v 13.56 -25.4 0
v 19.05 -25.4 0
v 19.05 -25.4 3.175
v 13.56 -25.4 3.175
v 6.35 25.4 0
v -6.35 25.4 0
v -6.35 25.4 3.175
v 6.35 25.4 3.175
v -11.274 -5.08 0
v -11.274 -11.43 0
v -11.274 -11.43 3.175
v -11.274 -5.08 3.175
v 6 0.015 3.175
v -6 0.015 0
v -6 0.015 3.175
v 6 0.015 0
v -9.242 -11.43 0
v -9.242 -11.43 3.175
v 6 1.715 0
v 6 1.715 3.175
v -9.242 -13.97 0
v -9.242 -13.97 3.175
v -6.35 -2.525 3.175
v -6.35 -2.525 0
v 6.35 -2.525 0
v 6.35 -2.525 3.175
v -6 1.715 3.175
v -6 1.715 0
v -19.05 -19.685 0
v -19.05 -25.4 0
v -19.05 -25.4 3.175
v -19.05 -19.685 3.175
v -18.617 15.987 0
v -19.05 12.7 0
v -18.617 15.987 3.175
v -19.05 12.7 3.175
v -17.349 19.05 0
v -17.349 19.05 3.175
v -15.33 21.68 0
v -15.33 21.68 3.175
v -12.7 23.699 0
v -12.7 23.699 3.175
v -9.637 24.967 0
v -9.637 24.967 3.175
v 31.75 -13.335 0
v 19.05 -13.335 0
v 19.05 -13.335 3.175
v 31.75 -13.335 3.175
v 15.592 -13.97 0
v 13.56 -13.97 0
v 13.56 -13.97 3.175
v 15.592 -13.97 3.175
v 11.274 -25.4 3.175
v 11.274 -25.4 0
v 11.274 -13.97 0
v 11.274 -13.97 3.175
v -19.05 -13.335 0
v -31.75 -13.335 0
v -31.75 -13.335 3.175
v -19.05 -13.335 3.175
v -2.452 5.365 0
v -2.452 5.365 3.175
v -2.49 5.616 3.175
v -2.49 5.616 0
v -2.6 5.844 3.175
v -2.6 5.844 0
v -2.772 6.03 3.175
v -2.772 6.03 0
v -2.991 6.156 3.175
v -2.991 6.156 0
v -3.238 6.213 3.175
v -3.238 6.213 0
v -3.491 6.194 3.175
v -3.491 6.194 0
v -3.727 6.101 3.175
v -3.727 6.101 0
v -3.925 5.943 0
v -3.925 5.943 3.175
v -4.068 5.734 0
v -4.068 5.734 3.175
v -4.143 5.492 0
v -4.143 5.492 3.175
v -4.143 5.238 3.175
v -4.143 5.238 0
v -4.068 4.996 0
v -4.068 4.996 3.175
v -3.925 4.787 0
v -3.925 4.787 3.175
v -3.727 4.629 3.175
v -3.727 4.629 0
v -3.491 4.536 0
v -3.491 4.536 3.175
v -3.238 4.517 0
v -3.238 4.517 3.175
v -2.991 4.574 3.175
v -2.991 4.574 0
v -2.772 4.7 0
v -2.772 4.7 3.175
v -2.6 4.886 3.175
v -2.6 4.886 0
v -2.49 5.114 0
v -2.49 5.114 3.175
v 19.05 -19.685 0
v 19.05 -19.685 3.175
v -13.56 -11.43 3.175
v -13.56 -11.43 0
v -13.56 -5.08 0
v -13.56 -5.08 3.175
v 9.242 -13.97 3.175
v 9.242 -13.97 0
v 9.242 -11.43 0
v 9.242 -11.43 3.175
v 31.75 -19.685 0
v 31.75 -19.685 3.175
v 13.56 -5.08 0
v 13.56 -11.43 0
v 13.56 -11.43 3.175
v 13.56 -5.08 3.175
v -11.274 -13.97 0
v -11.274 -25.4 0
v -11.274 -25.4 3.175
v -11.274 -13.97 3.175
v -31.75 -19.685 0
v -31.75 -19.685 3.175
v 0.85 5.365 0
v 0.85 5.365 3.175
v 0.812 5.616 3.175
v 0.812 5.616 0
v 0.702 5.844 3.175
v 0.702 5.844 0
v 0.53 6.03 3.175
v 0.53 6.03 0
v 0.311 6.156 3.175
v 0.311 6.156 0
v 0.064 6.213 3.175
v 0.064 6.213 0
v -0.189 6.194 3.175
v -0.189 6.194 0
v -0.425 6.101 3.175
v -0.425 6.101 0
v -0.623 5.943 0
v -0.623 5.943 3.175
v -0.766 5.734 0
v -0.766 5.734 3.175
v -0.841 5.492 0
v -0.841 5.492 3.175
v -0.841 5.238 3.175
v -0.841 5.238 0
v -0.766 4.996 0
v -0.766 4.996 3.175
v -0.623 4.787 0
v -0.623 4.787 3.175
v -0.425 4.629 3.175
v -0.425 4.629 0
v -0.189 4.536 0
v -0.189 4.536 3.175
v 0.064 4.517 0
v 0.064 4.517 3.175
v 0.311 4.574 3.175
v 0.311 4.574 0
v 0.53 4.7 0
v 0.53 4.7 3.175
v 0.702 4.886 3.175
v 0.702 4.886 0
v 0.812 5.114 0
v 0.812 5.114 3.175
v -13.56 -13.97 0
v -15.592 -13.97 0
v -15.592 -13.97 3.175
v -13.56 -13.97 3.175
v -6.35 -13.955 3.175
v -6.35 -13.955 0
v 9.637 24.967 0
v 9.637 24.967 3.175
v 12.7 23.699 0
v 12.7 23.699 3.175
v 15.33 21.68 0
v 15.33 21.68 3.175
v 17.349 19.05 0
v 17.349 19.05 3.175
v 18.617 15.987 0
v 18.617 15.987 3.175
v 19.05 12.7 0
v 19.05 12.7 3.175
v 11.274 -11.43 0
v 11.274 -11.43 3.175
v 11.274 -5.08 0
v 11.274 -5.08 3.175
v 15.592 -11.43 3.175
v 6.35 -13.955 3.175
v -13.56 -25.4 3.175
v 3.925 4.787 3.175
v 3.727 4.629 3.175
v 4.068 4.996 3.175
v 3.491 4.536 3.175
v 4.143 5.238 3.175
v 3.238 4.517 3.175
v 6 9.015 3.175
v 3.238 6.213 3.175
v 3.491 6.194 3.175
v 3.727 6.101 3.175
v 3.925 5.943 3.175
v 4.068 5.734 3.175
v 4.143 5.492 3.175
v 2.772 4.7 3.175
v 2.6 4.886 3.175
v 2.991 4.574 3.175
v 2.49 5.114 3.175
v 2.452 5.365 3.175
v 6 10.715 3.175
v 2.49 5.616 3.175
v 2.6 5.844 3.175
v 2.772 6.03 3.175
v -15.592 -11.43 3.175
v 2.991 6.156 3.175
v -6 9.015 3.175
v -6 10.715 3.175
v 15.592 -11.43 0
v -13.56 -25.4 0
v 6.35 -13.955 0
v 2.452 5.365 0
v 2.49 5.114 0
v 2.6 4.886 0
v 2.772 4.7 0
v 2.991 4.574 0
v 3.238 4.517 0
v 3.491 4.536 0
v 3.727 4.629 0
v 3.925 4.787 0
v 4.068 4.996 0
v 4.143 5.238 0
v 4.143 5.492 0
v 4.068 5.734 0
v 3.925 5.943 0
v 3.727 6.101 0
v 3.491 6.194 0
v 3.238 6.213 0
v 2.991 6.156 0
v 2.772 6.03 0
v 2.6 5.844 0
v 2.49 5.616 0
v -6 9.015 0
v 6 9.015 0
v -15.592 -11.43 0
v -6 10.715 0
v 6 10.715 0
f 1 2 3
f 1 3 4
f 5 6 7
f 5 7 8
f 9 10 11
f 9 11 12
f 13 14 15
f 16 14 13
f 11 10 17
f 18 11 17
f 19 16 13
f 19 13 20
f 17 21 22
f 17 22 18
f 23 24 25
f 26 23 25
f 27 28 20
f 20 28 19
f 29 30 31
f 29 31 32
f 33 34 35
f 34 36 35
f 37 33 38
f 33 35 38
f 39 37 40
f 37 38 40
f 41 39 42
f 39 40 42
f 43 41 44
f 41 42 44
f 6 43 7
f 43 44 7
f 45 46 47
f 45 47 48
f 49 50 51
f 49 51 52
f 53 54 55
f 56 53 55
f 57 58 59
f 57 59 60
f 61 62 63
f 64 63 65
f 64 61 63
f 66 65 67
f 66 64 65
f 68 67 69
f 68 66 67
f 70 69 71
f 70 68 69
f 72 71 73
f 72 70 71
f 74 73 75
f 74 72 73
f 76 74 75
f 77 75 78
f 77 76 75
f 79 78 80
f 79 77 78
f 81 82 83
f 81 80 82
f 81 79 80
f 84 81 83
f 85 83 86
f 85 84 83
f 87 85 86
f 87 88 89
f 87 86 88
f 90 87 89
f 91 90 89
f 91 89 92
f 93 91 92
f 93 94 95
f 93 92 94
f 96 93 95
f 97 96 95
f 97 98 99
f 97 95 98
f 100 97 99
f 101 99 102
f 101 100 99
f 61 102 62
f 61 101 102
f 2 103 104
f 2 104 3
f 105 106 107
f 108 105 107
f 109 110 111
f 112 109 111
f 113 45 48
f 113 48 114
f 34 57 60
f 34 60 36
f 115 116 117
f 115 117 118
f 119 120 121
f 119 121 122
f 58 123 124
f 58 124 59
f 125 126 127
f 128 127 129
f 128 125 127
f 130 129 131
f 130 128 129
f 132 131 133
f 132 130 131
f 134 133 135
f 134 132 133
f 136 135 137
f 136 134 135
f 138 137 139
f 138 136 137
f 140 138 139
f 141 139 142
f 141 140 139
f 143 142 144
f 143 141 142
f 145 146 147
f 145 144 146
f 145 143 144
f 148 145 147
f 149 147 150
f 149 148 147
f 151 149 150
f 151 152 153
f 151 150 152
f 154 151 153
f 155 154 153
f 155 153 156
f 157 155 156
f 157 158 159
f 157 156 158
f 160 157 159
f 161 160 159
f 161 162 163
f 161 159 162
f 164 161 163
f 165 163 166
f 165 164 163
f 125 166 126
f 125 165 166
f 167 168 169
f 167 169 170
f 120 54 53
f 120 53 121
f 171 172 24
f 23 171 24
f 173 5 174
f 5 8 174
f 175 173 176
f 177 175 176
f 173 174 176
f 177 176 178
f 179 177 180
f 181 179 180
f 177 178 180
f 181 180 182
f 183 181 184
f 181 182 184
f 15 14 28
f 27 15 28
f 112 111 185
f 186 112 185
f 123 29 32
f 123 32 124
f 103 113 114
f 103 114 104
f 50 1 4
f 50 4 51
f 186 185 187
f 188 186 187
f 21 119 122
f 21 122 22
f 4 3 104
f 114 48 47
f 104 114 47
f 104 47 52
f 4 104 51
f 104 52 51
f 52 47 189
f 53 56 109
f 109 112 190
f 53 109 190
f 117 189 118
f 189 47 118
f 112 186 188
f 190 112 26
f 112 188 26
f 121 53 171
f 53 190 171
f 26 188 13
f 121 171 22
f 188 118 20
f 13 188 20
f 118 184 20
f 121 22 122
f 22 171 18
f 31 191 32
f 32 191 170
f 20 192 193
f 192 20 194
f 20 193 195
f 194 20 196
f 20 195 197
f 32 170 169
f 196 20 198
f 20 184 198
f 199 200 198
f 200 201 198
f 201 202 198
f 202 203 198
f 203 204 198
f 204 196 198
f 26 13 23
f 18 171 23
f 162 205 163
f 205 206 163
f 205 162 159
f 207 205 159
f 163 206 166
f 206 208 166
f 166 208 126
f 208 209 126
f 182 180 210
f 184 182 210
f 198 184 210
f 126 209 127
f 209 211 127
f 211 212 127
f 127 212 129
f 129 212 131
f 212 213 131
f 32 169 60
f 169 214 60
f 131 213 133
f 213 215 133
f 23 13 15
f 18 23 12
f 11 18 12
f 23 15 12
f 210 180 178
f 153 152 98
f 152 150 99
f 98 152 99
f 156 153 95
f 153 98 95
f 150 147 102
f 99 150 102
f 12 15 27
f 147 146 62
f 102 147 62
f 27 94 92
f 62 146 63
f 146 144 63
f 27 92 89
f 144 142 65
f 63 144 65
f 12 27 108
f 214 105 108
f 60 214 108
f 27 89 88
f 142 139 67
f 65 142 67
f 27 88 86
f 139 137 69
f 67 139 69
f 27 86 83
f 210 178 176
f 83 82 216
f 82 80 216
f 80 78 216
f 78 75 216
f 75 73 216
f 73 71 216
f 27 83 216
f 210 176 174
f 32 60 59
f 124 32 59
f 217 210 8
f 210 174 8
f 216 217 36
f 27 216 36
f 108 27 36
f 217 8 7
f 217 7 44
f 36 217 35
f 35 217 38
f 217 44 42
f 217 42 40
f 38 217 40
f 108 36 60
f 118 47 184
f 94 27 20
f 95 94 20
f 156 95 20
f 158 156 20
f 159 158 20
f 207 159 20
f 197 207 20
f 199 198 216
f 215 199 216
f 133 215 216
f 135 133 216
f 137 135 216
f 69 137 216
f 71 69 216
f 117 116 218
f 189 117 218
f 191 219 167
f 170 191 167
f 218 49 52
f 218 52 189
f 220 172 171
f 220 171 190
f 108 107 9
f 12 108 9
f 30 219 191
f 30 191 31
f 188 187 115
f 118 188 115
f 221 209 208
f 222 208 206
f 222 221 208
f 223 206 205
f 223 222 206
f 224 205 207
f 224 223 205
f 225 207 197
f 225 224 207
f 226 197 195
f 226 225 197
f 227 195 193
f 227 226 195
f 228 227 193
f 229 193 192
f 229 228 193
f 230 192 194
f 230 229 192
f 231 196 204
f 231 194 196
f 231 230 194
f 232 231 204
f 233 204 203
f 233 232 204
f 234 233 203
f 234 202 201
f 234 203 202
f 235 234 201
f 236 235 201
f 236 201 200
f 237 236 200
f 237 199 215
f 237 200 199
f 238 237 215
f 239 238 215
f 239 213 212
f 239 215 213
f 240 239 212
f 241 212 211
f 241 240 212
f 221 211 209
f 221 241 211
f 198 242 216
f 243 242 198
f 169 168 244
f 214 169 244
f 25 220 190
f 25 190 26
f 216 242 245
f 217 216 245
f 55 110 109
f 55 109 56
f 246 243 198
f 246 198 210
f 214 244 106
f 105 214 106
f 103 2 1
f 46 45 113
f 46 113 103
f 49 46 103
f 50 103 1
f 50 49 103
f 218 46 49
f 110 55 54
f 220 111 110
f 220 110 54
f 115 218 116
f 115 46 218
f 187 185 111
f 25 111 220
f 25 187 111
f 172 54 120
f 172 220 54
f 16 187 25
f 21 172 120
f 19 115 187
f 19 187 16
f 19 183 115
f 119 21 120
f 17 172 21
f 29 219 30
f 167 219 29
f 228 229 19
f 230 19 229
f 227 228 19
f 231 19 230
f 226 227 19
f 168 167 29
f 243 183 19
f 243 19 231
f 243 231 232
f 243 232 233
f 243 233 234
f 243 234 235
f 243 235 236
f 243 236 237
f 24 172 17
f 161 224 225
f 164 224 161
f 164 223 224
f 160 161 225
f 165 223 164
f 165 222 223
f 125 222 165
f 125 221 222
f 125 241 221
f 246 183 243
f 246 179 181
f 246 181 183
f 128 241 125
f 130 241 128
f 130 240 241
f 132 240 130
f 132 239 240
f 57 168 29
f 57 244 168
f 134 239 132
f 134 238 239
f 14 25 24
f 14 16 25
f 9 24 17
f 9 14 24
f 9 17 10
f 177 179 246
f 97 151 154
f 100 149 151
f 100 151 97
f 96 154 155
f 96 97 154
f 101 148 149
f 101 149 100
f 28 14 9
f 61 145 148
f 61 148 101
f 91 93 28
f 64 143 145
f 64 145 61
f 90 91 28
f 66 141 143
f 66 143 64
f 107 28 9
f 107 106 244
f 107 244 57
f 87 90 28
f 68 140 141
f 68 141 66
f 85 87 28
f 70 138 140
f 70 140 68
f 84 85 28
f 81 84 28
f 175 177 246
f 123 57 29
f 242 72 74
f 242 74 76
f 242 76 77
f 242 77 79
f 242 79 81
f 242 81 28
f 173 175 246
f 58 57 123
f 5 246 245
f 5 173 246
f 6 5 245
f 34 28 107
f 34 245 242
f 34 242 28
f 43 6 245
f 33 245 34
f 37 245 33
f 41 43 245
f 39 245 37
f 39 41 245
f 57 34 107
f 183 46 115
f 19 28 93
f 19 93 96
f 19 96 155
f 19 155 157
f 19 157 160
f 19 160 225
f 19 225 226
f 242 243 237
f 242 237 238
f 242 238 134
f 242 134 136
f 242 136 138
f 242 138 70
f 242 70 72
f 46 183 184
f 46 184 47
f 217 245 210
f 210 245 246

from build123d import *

# Parameters (mm, degrees)
BOSS_EXTRUDE1_DEPTH = 3.175
FILLET1_R           = 12.7
SKETCH2_R           = 0.85
SKETCH2_W           = 12
SKETCH2_H           = 1.7
CUT_EXTRUDE1_DEPTH  = 41.783613437
SKETCH3_W           = 2.286
SKETCH3_H           = 20.32
SKETCH3_W_2         = 12.7
SKETCH3_H_2         = 11.43
SKETCH3_W_3         = 6.35
SKETCH3_H_3         = 2.54
CUT_EXTRUDE2_DEPTH  = 41.783613437


with BuildPart() as part:
    # Sketch1 → Boss-Extrude1 (new body)
    with BuildSketch(Plane.XY):
        Polygon((19.05, -25.4), (-19.05, -25.4), (-19.05, -19.685), (-31.75, -19.685), (-31.75, -13.335), (-19.05, -13.335), (-19.05, 25.4), (19.05, 25.4), (19.05, -13.335), (31.75, -13.335), (31.75, -19.685), (19.05, -19.685), align=None)
    extrude(amount=BOSS_EXTRUDE1_DEPTH)

    # Fillet1
    fillet1_edges = [part.edges().sort_by_distance(p)[0] for p in [
        (-19.05, 25.4, 1.5875),
        (19.05, 25.4, 1.5875),
    ]]
    fillet(fillet1_edges, radius=FILLET1_R)

    # Sketch2 → Cut-Extrude1 (cut, through all)
    with BuildSketch(Plane.XY):
        with Locations((0, 5.364988)):
            Circle(SKETCH2_R)
        with Locations((-3.302, 5.364988)):
            Circle(SKETCH2_R)
        with Locations(Location((3.302, 5.364988, 0), (0, 0, 180))):
            Circle(SKETCH2_R)
        with Locations((0, 0.864988)):
            Rectangle(SKETCH2_W, SKETCH2_H)
        with Locations((0, 9.864988)):
            Rectangle(SKETCH2_W, SKETCH2_H)
    extrude(amount=CUT_EXTRUDE1_DEPTH, mode=Mode.SUBTRACT)

    # Sketch3 → Cut-Extrude2 (cut, through all)
    with BuildSketch(Plane.XY):
        with Locations((-12.4167697, -15.24)):
            Rectangle(SKETCH3_W, SKETCH3_H)
        with Locations((0, -8.240012)):
            Rectangle(SKETCH3_W_2, SKETCH3_H_2)
        with Locations((-12.4167697, -12.7)):
            Rectangle(SKETCH3_W_3, SKETCH3_H_3)
        with Locations((12.4167697, -12.7)):
            Rectangle(SKETCH3_W_3, SKETCH3_H_3)
        with Locations((12.4167697, -15.24)):
            Rectangle(SKETCH3_W, SKETCH3_H)
    extrude(amount=CUT_EXTRUDE2_DEPTH, mode=Mode.SUBTRACT)


solid = part.part
